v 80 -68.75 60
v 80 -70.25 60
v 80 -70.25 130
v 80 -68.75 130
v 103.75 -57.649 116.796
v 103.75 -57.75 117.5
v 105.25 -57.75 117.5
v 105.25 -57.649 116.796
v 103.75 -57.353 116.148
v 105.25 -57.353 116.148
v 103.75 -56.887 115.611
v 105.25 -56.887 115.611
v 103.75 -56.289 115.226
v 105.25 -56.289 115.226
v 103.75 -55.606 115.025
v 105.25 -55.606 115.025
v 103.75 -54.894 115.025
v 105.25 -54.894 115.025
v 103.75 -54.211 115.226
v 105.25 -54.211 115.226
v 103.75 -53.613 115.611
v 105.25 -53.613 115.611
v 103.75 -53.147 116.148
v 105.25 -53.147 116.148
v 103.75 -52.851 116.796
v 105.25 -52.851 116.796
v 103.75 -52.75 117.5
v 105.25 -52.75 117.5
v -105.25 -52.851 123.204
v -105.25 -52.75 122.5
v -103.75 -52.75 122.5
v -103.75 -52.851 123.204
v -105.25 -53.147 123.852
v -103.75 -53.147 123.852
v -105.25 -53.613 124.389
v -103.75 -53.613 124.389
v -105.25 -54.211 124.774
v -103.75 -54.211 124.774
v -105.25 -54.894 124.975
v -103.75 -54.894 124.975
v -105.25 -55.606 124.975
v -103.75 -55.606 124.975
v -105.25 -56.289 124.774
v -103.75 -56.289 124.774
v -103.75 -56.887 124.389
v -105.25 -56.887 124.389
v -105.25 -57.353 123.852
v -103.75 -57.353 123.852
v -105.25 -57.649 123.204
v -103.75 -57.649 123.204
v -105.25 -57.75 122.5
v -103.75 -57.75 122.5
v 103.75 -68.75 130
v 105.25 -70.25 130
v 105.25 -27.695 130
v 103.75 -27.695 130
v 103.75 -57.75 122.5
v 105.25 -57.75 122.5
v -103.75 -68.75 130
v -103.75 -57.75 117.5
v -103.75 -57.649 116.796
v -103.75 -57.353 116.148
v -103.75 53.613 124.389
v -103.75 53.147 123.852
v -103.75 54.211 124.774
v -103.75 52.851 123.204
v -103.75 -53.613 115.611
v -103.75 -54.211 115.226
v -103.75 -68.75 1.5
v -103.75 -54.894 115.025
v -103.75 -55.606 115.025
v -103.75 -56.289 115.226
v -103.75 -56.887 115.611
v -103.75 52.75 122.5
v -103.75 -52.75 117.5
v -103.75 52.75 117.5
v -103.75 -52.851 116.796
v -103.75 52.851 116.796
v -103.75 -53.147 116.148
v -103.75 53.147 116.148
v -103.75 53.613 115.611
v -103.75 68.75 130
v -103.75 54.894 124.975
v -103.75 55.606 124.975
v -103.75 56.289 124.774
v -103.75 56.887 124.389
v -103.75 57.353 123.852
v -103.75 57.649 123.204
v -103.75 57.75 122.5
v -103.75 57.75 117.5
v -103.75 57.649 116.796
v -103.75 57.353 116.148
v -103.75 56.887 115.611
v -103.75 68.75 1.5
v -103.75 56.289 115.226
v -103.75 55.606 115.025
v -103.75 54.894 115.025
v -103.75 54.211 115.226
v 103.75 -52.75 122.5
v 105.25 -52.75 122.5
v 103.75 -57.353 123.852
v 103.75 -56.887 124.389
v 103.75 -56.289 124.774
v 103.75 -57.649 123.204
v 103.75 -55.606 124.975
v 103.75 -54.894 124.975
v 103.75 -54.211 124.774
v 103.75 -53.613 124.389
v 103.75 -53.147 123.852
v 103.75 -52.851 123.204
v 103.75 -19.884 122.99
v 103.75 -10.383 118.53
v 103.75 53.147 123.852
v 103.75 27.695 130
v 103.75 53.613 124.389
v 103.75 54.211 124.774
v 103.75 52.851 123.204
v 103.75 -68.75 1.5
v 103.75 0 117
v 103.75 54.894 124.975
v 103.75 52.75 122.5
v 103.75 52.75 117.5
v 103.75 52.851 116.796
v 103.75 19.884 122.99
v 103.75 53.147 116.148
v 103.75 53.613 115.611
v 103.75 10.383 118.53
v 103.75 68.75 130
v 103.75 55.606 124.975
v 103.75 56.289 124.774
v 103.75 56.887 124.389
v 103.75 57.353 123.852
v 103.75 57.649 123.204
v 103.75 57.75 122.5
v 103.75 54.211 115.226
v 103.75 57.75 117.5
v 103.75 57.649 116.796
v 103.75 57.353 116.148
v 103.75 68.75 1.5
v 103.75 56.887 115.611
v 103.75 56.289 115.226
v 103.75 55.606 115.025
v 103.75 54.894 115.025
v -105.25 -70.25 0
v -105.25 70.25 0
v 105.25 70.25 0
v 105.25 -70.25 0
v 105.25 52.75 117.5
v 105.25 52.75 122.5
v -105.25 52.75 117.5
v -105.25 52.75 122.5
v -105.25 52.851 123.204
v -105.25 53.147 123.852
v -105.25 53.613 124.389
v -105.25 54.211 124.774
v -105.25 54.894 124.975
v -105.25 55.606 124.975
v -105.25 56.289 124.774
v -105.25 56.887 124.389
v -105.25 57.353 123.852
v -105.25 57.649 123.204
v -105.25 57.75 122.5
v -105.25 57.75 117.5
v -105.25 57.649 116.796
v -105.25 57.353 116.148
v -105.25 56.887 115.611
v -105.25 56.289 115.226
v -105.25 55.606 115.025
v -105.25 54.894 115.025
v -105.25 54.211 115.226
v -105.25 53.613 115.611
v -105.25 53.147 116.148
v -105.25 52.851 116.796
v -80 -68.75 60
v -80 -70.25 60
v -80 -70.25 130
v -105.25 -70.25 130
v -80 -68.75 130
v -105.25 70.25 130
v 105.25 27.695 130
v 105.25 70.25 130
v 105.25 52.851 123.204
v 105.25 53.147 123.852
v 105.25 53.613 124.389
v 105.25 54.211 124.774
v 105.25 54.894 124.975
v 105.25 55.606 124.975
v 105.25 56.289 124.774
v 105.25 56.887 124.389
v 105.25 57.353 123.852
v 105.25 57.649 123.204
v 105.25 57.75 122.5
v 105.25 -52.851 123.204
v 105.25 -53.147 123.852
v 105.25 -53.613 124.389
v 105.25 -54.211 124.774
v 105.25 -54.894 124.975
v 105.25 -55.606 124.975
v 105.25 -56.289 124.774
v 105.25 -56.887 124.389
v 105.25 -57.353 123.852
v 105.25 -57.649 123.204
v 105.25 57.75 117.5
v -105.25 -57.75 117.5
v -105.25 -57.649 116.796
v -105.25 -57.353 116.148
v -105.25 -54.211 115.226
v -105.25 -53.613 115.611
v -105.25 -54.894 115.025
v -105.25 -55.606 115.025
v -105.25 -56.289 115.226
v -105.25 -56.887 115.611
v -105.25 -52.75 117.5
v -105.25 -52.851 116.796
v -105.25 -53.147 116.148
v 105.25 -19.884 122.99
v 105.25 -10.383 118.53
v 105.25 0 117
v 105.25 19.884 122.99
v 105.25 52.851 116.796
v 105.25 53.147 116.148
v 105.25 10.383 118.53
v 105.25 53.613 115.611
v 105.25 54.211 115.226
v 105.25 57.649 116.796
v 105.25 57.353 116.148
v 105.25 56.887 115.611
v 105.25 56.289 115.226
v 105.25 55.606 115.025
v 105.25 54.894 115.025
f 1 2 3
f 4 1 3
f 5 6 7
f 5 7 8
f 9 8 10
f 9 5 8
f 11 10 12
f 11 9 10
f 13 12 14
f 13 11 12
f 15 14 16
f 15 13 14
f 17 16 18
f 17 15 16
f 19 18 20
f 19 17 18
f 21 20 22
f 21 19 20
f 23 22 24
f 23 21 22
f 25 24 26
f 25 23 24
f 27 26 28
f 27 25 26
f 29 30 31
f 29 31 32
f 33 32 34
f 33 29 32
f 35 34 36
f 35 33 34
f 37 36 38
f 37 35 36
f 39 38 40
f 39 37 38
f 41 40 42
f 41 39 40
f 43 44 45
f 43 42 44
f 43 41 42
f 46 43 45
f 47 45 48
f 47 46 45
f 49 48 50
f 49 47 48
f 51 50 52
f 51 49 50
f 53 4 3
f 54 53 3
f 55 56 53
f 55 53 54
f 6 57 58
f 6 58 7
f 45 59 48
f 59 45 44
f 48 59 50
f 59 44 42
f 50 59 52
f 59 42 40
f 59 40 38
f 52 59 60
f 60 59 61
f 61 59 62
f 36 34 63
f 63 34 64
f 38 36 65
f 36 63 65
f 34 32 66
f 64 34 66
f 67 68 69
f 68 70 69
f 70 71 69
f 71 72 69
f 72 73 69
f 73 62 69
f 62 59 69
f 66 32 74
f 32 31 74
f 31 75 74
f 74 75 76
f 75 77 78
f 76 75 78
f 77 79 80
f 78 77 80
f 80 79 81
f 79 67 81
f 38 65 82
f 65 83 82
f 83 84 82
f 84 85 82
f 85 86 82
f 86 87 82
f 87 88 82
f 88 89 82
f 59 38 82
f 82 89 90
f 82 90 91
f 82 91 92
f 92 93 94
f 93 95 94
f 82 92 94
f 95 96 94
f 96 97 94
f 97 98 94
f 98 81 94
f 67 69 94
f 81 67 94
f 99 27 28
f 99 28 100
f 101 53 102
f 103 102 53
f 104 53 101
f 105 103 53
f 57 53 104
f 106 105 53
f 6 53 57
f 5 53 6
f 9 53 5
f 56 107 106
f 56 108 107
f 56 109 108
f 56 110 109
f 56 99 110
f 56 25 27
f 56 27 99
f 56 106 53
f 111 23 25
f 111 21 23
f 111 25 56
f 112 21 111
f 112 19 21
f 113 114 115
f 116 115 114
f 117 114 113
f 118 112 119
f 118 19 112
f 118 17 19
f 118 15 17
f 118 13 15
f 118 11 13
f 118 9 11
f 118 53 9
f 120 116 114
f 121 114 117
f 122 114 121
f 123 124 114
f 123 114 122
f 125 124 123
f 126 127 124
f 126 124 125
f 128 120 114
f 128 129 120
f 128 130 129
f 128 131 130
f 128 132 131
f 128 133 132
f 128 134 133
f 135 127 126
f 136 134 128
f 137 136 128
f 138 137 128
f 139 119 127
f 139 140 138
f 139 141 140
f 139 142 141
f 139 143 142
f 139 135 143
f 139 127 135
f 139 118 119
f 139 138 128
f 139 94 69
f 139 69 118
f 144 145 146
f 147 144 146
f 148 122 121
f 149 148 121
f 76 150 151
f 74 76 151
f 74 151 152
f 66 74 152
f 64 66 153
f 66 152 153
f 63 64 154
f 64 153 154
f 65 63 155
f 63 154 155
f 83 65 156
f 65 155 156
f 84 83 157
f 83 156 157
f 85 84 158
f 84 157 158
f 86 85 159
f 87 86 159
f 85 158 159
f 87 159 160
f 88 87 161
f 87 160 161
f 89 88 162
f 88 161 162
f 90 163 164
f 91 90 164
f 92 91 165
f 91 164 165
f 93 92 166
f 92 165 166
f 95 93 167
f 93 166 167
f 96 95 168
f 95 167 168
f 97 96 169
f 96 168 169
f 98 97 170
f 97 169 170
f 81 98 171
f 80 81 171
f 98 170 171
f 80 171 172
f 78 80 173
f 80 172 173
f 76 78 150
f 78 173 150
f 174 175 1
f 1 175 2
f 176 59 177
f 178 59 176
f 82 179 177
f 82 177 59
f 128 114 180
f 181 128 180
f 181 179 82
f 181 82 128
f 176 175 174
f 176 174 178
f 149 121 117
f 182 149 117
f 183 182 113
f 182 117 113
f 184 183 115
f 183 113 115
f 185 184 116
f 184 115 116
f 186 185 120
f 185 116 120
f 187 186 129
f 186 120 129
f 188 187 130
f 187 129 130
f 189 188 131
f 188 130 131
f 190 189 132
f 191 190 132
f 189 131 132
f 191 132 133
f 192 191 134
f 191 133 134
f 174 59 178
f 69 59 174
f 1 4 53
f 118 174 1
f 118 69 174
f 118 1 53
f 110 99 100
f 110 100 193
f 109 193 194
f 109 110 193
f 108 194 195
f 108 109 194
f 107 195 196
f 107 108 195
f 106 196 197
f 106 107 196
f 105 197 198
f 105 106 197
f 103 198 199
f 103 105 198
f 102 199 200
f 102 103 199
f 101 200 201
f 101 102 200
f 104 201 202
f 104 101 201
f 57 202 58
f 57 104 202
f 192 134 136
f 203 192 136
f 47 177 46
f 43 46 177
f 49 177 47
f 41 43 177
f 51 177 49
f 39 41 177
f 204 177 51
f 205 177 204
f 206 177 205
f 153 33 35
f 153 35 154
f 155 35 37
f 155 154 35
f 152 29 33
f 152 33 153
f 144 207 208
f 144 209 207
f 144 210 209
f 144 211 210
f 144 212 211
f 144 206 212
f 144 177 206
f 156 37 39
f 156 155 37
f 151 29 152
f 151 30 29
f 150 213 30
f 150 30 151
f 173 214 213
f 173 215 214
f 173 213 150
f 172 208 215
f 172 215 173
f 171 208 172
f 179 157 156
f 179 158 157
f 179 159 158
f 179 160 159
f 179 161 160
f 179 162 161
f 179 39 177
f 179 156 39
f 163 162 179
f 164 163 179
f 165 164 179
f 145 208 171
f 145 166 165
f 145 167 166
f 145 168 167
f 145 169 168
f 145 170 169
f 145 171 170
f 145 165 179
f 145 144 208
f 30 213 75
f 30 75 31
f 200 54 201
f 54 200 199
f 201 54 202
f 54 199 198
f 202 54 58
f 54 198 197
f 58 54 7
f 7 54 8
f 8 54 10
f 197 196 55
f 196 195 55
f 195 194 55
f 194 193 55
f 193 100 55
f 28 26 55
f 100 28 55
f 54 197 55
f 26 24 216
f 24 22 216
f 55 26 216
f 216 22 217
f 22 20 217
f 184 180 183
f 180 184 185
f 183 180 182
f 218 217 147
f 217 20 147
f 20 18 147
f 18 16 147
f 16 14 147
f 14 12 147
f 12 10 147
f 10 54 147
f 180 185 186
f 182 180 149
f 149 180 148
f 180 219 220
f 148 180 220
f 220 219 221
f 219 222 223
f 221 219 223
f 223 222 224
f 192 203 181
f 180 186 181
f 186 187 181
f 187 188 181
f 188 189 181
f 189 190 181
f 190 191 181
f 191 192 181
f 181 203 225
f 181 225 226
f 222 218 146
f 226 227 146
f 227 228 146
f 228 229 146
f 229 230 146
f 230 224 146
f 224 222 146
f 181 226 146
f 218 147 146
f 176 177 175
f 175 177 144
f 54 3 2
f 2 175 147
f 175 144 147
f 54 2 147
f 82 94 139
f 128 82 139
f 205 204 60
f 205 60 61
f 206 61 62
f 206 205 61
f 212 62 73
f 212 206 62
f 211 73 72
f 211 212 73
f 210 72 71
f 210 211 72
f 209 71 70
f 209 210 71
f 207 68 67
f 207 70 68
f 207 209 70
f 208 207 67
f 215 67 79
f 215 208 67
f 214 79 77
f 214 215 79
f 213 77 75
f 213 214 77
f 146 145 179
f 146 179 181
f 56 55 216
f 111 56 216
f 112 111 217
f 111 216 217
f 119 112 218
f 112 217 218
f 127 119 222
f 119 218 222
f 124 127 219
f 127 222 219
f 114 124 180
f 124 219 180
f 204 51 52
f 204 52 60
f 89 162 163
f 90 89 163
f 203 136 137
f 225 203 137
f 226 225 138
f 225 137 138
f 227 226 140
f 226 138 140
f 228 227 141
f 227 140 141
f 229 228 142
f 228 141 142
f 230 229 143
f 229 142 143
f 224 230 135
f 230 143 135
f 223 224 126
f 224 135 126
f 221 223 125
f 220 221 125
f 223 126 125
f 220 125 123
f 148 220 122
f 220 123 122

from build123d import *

# Parameters (mm, degrees)
SKETCH_1_W               = 210.5
SKETCH_1_H               = 140.5
EXTRUDE_1_DEPTH          = 130
SHELL_1_T                = -1.5
CUT_EXTRUDE_2_REACH      = 259.187
CUT_EXTRUDE_3_REACH      = 220.444
SKETCH_3_W               = 160
SKETCH_3_H               = 70
CUT_EXTRUDE_4_DEPTH      = 258.187310146
CUT_EXTRUDE_4_DEPTH_BACK = 258.187310146


with BuildPart() as part:
    # 草图1 → 凸台-拉伸1 (new body)
    with BuildSketch(Plane.XY):
        Rectangle(SKETCH_1_W, SKETCH_1_H)
    extrude(amount=EXTRUDE_1_DEPTH)

    # 抽壳1
    shell_1_openings = [part.faces().sort_by_distance(p)[0] for p in [
        (0, 0, 130),
    ]]
    offset(amount=SHELL_1_T, openings=shell_1_openings, kind=Kind.INTERSECTION)

    # 草图2 → 切除-拉伸2 (cut, up to next)
    with BuildSketch(Plane(origin=(105.25, 0, 0), x_dir=(0, 0, -1), z_dir=(1, 0, 0)), mode=Mode.PRIVATE) as cut_extrude_2_sk1:
        with BuildLine():
            Line((-130, 27.694764848), (-130, -27.694764848))
            ThreePointArc((-130, -27.694764848), (-117, 0), (-130, 27.694764848))
        make_face()
    cut_extrude_2_tool1 = extrude(cut_extrude_2_sk1.sketch, amount=-CUT_EXTRUDE_2_REACH, mode=Mode.PRIVATE) & part.part
    add(cut_extrude_2_tool1.solids().sort_by_distance((105.25, 0, 124.710058))[0], mode=Mode.SUBTRACT)

    # 草图3 → 切除-拉伸3 (cut, up to next)
    with BuildSketch(Plane.XZ.offset(70.25), mode=Mode.PRIVATE) as cut_extrude_3_sk1:
        with Locations((0, 95)):
            Rectangle(SKETCH_3_W, SKETCH_3_H)
    cut_extrude_3_tool1 = extrude(cut_extrude_3_sk1.sketch, amount=-CUT_EXTRUDE_3_REACH, mode=Mode.PRIVATE) & part.part
    add(cut_extrude_3_tool1.solids().sort_by_distance((0, -70.25, 95))[0], mode=Mode.SUBTRACT)

    # 草图4 → 切除-拉伸4 (cut, two sides: drawn at the far end of the back side and taken through both)
    with BuildSketch(Plane(origin=(105.25, 0, 0), x_dir=(0, 0, -1), z_dir=(1, 0, 0)).offset(-CUT_EXTRUDE_4_DEPTH_BACK)):
        with BuildLine():
            Line((-122.5, 57.75), (-117.5, 57.75))
            ThreePointArc((-117.5, 57.75), (-115, 55.25), (-117.5, 52.75))
            Line((-117.5, 52.75), (-122.5, 52.75))
            ThreePointArc((-122.5, 52.75), (-125, 55.25), (-122.5, 57.75))
        make_face()
        with BuildLine():
            Line((-122.5, -57.75), (-117.5, -57.75))
            ThreePointArc((-117.5, -57.75), (-115, -55.25), (-117.5, -52.75))
            Line((-117.5, -52.75), (-122.5, -52.75))
            ThreePointArc((-122.5, -52.75), (-125, -55.25), (-122.5, -57.75))
        make_face()
    extrude(amount=CUT_EXTRUDE_4_DEPTH + CUT_EXTRUDE_4_DEPTH_BACK, mode=Mode.SUBTRACT)


solid = part.part
